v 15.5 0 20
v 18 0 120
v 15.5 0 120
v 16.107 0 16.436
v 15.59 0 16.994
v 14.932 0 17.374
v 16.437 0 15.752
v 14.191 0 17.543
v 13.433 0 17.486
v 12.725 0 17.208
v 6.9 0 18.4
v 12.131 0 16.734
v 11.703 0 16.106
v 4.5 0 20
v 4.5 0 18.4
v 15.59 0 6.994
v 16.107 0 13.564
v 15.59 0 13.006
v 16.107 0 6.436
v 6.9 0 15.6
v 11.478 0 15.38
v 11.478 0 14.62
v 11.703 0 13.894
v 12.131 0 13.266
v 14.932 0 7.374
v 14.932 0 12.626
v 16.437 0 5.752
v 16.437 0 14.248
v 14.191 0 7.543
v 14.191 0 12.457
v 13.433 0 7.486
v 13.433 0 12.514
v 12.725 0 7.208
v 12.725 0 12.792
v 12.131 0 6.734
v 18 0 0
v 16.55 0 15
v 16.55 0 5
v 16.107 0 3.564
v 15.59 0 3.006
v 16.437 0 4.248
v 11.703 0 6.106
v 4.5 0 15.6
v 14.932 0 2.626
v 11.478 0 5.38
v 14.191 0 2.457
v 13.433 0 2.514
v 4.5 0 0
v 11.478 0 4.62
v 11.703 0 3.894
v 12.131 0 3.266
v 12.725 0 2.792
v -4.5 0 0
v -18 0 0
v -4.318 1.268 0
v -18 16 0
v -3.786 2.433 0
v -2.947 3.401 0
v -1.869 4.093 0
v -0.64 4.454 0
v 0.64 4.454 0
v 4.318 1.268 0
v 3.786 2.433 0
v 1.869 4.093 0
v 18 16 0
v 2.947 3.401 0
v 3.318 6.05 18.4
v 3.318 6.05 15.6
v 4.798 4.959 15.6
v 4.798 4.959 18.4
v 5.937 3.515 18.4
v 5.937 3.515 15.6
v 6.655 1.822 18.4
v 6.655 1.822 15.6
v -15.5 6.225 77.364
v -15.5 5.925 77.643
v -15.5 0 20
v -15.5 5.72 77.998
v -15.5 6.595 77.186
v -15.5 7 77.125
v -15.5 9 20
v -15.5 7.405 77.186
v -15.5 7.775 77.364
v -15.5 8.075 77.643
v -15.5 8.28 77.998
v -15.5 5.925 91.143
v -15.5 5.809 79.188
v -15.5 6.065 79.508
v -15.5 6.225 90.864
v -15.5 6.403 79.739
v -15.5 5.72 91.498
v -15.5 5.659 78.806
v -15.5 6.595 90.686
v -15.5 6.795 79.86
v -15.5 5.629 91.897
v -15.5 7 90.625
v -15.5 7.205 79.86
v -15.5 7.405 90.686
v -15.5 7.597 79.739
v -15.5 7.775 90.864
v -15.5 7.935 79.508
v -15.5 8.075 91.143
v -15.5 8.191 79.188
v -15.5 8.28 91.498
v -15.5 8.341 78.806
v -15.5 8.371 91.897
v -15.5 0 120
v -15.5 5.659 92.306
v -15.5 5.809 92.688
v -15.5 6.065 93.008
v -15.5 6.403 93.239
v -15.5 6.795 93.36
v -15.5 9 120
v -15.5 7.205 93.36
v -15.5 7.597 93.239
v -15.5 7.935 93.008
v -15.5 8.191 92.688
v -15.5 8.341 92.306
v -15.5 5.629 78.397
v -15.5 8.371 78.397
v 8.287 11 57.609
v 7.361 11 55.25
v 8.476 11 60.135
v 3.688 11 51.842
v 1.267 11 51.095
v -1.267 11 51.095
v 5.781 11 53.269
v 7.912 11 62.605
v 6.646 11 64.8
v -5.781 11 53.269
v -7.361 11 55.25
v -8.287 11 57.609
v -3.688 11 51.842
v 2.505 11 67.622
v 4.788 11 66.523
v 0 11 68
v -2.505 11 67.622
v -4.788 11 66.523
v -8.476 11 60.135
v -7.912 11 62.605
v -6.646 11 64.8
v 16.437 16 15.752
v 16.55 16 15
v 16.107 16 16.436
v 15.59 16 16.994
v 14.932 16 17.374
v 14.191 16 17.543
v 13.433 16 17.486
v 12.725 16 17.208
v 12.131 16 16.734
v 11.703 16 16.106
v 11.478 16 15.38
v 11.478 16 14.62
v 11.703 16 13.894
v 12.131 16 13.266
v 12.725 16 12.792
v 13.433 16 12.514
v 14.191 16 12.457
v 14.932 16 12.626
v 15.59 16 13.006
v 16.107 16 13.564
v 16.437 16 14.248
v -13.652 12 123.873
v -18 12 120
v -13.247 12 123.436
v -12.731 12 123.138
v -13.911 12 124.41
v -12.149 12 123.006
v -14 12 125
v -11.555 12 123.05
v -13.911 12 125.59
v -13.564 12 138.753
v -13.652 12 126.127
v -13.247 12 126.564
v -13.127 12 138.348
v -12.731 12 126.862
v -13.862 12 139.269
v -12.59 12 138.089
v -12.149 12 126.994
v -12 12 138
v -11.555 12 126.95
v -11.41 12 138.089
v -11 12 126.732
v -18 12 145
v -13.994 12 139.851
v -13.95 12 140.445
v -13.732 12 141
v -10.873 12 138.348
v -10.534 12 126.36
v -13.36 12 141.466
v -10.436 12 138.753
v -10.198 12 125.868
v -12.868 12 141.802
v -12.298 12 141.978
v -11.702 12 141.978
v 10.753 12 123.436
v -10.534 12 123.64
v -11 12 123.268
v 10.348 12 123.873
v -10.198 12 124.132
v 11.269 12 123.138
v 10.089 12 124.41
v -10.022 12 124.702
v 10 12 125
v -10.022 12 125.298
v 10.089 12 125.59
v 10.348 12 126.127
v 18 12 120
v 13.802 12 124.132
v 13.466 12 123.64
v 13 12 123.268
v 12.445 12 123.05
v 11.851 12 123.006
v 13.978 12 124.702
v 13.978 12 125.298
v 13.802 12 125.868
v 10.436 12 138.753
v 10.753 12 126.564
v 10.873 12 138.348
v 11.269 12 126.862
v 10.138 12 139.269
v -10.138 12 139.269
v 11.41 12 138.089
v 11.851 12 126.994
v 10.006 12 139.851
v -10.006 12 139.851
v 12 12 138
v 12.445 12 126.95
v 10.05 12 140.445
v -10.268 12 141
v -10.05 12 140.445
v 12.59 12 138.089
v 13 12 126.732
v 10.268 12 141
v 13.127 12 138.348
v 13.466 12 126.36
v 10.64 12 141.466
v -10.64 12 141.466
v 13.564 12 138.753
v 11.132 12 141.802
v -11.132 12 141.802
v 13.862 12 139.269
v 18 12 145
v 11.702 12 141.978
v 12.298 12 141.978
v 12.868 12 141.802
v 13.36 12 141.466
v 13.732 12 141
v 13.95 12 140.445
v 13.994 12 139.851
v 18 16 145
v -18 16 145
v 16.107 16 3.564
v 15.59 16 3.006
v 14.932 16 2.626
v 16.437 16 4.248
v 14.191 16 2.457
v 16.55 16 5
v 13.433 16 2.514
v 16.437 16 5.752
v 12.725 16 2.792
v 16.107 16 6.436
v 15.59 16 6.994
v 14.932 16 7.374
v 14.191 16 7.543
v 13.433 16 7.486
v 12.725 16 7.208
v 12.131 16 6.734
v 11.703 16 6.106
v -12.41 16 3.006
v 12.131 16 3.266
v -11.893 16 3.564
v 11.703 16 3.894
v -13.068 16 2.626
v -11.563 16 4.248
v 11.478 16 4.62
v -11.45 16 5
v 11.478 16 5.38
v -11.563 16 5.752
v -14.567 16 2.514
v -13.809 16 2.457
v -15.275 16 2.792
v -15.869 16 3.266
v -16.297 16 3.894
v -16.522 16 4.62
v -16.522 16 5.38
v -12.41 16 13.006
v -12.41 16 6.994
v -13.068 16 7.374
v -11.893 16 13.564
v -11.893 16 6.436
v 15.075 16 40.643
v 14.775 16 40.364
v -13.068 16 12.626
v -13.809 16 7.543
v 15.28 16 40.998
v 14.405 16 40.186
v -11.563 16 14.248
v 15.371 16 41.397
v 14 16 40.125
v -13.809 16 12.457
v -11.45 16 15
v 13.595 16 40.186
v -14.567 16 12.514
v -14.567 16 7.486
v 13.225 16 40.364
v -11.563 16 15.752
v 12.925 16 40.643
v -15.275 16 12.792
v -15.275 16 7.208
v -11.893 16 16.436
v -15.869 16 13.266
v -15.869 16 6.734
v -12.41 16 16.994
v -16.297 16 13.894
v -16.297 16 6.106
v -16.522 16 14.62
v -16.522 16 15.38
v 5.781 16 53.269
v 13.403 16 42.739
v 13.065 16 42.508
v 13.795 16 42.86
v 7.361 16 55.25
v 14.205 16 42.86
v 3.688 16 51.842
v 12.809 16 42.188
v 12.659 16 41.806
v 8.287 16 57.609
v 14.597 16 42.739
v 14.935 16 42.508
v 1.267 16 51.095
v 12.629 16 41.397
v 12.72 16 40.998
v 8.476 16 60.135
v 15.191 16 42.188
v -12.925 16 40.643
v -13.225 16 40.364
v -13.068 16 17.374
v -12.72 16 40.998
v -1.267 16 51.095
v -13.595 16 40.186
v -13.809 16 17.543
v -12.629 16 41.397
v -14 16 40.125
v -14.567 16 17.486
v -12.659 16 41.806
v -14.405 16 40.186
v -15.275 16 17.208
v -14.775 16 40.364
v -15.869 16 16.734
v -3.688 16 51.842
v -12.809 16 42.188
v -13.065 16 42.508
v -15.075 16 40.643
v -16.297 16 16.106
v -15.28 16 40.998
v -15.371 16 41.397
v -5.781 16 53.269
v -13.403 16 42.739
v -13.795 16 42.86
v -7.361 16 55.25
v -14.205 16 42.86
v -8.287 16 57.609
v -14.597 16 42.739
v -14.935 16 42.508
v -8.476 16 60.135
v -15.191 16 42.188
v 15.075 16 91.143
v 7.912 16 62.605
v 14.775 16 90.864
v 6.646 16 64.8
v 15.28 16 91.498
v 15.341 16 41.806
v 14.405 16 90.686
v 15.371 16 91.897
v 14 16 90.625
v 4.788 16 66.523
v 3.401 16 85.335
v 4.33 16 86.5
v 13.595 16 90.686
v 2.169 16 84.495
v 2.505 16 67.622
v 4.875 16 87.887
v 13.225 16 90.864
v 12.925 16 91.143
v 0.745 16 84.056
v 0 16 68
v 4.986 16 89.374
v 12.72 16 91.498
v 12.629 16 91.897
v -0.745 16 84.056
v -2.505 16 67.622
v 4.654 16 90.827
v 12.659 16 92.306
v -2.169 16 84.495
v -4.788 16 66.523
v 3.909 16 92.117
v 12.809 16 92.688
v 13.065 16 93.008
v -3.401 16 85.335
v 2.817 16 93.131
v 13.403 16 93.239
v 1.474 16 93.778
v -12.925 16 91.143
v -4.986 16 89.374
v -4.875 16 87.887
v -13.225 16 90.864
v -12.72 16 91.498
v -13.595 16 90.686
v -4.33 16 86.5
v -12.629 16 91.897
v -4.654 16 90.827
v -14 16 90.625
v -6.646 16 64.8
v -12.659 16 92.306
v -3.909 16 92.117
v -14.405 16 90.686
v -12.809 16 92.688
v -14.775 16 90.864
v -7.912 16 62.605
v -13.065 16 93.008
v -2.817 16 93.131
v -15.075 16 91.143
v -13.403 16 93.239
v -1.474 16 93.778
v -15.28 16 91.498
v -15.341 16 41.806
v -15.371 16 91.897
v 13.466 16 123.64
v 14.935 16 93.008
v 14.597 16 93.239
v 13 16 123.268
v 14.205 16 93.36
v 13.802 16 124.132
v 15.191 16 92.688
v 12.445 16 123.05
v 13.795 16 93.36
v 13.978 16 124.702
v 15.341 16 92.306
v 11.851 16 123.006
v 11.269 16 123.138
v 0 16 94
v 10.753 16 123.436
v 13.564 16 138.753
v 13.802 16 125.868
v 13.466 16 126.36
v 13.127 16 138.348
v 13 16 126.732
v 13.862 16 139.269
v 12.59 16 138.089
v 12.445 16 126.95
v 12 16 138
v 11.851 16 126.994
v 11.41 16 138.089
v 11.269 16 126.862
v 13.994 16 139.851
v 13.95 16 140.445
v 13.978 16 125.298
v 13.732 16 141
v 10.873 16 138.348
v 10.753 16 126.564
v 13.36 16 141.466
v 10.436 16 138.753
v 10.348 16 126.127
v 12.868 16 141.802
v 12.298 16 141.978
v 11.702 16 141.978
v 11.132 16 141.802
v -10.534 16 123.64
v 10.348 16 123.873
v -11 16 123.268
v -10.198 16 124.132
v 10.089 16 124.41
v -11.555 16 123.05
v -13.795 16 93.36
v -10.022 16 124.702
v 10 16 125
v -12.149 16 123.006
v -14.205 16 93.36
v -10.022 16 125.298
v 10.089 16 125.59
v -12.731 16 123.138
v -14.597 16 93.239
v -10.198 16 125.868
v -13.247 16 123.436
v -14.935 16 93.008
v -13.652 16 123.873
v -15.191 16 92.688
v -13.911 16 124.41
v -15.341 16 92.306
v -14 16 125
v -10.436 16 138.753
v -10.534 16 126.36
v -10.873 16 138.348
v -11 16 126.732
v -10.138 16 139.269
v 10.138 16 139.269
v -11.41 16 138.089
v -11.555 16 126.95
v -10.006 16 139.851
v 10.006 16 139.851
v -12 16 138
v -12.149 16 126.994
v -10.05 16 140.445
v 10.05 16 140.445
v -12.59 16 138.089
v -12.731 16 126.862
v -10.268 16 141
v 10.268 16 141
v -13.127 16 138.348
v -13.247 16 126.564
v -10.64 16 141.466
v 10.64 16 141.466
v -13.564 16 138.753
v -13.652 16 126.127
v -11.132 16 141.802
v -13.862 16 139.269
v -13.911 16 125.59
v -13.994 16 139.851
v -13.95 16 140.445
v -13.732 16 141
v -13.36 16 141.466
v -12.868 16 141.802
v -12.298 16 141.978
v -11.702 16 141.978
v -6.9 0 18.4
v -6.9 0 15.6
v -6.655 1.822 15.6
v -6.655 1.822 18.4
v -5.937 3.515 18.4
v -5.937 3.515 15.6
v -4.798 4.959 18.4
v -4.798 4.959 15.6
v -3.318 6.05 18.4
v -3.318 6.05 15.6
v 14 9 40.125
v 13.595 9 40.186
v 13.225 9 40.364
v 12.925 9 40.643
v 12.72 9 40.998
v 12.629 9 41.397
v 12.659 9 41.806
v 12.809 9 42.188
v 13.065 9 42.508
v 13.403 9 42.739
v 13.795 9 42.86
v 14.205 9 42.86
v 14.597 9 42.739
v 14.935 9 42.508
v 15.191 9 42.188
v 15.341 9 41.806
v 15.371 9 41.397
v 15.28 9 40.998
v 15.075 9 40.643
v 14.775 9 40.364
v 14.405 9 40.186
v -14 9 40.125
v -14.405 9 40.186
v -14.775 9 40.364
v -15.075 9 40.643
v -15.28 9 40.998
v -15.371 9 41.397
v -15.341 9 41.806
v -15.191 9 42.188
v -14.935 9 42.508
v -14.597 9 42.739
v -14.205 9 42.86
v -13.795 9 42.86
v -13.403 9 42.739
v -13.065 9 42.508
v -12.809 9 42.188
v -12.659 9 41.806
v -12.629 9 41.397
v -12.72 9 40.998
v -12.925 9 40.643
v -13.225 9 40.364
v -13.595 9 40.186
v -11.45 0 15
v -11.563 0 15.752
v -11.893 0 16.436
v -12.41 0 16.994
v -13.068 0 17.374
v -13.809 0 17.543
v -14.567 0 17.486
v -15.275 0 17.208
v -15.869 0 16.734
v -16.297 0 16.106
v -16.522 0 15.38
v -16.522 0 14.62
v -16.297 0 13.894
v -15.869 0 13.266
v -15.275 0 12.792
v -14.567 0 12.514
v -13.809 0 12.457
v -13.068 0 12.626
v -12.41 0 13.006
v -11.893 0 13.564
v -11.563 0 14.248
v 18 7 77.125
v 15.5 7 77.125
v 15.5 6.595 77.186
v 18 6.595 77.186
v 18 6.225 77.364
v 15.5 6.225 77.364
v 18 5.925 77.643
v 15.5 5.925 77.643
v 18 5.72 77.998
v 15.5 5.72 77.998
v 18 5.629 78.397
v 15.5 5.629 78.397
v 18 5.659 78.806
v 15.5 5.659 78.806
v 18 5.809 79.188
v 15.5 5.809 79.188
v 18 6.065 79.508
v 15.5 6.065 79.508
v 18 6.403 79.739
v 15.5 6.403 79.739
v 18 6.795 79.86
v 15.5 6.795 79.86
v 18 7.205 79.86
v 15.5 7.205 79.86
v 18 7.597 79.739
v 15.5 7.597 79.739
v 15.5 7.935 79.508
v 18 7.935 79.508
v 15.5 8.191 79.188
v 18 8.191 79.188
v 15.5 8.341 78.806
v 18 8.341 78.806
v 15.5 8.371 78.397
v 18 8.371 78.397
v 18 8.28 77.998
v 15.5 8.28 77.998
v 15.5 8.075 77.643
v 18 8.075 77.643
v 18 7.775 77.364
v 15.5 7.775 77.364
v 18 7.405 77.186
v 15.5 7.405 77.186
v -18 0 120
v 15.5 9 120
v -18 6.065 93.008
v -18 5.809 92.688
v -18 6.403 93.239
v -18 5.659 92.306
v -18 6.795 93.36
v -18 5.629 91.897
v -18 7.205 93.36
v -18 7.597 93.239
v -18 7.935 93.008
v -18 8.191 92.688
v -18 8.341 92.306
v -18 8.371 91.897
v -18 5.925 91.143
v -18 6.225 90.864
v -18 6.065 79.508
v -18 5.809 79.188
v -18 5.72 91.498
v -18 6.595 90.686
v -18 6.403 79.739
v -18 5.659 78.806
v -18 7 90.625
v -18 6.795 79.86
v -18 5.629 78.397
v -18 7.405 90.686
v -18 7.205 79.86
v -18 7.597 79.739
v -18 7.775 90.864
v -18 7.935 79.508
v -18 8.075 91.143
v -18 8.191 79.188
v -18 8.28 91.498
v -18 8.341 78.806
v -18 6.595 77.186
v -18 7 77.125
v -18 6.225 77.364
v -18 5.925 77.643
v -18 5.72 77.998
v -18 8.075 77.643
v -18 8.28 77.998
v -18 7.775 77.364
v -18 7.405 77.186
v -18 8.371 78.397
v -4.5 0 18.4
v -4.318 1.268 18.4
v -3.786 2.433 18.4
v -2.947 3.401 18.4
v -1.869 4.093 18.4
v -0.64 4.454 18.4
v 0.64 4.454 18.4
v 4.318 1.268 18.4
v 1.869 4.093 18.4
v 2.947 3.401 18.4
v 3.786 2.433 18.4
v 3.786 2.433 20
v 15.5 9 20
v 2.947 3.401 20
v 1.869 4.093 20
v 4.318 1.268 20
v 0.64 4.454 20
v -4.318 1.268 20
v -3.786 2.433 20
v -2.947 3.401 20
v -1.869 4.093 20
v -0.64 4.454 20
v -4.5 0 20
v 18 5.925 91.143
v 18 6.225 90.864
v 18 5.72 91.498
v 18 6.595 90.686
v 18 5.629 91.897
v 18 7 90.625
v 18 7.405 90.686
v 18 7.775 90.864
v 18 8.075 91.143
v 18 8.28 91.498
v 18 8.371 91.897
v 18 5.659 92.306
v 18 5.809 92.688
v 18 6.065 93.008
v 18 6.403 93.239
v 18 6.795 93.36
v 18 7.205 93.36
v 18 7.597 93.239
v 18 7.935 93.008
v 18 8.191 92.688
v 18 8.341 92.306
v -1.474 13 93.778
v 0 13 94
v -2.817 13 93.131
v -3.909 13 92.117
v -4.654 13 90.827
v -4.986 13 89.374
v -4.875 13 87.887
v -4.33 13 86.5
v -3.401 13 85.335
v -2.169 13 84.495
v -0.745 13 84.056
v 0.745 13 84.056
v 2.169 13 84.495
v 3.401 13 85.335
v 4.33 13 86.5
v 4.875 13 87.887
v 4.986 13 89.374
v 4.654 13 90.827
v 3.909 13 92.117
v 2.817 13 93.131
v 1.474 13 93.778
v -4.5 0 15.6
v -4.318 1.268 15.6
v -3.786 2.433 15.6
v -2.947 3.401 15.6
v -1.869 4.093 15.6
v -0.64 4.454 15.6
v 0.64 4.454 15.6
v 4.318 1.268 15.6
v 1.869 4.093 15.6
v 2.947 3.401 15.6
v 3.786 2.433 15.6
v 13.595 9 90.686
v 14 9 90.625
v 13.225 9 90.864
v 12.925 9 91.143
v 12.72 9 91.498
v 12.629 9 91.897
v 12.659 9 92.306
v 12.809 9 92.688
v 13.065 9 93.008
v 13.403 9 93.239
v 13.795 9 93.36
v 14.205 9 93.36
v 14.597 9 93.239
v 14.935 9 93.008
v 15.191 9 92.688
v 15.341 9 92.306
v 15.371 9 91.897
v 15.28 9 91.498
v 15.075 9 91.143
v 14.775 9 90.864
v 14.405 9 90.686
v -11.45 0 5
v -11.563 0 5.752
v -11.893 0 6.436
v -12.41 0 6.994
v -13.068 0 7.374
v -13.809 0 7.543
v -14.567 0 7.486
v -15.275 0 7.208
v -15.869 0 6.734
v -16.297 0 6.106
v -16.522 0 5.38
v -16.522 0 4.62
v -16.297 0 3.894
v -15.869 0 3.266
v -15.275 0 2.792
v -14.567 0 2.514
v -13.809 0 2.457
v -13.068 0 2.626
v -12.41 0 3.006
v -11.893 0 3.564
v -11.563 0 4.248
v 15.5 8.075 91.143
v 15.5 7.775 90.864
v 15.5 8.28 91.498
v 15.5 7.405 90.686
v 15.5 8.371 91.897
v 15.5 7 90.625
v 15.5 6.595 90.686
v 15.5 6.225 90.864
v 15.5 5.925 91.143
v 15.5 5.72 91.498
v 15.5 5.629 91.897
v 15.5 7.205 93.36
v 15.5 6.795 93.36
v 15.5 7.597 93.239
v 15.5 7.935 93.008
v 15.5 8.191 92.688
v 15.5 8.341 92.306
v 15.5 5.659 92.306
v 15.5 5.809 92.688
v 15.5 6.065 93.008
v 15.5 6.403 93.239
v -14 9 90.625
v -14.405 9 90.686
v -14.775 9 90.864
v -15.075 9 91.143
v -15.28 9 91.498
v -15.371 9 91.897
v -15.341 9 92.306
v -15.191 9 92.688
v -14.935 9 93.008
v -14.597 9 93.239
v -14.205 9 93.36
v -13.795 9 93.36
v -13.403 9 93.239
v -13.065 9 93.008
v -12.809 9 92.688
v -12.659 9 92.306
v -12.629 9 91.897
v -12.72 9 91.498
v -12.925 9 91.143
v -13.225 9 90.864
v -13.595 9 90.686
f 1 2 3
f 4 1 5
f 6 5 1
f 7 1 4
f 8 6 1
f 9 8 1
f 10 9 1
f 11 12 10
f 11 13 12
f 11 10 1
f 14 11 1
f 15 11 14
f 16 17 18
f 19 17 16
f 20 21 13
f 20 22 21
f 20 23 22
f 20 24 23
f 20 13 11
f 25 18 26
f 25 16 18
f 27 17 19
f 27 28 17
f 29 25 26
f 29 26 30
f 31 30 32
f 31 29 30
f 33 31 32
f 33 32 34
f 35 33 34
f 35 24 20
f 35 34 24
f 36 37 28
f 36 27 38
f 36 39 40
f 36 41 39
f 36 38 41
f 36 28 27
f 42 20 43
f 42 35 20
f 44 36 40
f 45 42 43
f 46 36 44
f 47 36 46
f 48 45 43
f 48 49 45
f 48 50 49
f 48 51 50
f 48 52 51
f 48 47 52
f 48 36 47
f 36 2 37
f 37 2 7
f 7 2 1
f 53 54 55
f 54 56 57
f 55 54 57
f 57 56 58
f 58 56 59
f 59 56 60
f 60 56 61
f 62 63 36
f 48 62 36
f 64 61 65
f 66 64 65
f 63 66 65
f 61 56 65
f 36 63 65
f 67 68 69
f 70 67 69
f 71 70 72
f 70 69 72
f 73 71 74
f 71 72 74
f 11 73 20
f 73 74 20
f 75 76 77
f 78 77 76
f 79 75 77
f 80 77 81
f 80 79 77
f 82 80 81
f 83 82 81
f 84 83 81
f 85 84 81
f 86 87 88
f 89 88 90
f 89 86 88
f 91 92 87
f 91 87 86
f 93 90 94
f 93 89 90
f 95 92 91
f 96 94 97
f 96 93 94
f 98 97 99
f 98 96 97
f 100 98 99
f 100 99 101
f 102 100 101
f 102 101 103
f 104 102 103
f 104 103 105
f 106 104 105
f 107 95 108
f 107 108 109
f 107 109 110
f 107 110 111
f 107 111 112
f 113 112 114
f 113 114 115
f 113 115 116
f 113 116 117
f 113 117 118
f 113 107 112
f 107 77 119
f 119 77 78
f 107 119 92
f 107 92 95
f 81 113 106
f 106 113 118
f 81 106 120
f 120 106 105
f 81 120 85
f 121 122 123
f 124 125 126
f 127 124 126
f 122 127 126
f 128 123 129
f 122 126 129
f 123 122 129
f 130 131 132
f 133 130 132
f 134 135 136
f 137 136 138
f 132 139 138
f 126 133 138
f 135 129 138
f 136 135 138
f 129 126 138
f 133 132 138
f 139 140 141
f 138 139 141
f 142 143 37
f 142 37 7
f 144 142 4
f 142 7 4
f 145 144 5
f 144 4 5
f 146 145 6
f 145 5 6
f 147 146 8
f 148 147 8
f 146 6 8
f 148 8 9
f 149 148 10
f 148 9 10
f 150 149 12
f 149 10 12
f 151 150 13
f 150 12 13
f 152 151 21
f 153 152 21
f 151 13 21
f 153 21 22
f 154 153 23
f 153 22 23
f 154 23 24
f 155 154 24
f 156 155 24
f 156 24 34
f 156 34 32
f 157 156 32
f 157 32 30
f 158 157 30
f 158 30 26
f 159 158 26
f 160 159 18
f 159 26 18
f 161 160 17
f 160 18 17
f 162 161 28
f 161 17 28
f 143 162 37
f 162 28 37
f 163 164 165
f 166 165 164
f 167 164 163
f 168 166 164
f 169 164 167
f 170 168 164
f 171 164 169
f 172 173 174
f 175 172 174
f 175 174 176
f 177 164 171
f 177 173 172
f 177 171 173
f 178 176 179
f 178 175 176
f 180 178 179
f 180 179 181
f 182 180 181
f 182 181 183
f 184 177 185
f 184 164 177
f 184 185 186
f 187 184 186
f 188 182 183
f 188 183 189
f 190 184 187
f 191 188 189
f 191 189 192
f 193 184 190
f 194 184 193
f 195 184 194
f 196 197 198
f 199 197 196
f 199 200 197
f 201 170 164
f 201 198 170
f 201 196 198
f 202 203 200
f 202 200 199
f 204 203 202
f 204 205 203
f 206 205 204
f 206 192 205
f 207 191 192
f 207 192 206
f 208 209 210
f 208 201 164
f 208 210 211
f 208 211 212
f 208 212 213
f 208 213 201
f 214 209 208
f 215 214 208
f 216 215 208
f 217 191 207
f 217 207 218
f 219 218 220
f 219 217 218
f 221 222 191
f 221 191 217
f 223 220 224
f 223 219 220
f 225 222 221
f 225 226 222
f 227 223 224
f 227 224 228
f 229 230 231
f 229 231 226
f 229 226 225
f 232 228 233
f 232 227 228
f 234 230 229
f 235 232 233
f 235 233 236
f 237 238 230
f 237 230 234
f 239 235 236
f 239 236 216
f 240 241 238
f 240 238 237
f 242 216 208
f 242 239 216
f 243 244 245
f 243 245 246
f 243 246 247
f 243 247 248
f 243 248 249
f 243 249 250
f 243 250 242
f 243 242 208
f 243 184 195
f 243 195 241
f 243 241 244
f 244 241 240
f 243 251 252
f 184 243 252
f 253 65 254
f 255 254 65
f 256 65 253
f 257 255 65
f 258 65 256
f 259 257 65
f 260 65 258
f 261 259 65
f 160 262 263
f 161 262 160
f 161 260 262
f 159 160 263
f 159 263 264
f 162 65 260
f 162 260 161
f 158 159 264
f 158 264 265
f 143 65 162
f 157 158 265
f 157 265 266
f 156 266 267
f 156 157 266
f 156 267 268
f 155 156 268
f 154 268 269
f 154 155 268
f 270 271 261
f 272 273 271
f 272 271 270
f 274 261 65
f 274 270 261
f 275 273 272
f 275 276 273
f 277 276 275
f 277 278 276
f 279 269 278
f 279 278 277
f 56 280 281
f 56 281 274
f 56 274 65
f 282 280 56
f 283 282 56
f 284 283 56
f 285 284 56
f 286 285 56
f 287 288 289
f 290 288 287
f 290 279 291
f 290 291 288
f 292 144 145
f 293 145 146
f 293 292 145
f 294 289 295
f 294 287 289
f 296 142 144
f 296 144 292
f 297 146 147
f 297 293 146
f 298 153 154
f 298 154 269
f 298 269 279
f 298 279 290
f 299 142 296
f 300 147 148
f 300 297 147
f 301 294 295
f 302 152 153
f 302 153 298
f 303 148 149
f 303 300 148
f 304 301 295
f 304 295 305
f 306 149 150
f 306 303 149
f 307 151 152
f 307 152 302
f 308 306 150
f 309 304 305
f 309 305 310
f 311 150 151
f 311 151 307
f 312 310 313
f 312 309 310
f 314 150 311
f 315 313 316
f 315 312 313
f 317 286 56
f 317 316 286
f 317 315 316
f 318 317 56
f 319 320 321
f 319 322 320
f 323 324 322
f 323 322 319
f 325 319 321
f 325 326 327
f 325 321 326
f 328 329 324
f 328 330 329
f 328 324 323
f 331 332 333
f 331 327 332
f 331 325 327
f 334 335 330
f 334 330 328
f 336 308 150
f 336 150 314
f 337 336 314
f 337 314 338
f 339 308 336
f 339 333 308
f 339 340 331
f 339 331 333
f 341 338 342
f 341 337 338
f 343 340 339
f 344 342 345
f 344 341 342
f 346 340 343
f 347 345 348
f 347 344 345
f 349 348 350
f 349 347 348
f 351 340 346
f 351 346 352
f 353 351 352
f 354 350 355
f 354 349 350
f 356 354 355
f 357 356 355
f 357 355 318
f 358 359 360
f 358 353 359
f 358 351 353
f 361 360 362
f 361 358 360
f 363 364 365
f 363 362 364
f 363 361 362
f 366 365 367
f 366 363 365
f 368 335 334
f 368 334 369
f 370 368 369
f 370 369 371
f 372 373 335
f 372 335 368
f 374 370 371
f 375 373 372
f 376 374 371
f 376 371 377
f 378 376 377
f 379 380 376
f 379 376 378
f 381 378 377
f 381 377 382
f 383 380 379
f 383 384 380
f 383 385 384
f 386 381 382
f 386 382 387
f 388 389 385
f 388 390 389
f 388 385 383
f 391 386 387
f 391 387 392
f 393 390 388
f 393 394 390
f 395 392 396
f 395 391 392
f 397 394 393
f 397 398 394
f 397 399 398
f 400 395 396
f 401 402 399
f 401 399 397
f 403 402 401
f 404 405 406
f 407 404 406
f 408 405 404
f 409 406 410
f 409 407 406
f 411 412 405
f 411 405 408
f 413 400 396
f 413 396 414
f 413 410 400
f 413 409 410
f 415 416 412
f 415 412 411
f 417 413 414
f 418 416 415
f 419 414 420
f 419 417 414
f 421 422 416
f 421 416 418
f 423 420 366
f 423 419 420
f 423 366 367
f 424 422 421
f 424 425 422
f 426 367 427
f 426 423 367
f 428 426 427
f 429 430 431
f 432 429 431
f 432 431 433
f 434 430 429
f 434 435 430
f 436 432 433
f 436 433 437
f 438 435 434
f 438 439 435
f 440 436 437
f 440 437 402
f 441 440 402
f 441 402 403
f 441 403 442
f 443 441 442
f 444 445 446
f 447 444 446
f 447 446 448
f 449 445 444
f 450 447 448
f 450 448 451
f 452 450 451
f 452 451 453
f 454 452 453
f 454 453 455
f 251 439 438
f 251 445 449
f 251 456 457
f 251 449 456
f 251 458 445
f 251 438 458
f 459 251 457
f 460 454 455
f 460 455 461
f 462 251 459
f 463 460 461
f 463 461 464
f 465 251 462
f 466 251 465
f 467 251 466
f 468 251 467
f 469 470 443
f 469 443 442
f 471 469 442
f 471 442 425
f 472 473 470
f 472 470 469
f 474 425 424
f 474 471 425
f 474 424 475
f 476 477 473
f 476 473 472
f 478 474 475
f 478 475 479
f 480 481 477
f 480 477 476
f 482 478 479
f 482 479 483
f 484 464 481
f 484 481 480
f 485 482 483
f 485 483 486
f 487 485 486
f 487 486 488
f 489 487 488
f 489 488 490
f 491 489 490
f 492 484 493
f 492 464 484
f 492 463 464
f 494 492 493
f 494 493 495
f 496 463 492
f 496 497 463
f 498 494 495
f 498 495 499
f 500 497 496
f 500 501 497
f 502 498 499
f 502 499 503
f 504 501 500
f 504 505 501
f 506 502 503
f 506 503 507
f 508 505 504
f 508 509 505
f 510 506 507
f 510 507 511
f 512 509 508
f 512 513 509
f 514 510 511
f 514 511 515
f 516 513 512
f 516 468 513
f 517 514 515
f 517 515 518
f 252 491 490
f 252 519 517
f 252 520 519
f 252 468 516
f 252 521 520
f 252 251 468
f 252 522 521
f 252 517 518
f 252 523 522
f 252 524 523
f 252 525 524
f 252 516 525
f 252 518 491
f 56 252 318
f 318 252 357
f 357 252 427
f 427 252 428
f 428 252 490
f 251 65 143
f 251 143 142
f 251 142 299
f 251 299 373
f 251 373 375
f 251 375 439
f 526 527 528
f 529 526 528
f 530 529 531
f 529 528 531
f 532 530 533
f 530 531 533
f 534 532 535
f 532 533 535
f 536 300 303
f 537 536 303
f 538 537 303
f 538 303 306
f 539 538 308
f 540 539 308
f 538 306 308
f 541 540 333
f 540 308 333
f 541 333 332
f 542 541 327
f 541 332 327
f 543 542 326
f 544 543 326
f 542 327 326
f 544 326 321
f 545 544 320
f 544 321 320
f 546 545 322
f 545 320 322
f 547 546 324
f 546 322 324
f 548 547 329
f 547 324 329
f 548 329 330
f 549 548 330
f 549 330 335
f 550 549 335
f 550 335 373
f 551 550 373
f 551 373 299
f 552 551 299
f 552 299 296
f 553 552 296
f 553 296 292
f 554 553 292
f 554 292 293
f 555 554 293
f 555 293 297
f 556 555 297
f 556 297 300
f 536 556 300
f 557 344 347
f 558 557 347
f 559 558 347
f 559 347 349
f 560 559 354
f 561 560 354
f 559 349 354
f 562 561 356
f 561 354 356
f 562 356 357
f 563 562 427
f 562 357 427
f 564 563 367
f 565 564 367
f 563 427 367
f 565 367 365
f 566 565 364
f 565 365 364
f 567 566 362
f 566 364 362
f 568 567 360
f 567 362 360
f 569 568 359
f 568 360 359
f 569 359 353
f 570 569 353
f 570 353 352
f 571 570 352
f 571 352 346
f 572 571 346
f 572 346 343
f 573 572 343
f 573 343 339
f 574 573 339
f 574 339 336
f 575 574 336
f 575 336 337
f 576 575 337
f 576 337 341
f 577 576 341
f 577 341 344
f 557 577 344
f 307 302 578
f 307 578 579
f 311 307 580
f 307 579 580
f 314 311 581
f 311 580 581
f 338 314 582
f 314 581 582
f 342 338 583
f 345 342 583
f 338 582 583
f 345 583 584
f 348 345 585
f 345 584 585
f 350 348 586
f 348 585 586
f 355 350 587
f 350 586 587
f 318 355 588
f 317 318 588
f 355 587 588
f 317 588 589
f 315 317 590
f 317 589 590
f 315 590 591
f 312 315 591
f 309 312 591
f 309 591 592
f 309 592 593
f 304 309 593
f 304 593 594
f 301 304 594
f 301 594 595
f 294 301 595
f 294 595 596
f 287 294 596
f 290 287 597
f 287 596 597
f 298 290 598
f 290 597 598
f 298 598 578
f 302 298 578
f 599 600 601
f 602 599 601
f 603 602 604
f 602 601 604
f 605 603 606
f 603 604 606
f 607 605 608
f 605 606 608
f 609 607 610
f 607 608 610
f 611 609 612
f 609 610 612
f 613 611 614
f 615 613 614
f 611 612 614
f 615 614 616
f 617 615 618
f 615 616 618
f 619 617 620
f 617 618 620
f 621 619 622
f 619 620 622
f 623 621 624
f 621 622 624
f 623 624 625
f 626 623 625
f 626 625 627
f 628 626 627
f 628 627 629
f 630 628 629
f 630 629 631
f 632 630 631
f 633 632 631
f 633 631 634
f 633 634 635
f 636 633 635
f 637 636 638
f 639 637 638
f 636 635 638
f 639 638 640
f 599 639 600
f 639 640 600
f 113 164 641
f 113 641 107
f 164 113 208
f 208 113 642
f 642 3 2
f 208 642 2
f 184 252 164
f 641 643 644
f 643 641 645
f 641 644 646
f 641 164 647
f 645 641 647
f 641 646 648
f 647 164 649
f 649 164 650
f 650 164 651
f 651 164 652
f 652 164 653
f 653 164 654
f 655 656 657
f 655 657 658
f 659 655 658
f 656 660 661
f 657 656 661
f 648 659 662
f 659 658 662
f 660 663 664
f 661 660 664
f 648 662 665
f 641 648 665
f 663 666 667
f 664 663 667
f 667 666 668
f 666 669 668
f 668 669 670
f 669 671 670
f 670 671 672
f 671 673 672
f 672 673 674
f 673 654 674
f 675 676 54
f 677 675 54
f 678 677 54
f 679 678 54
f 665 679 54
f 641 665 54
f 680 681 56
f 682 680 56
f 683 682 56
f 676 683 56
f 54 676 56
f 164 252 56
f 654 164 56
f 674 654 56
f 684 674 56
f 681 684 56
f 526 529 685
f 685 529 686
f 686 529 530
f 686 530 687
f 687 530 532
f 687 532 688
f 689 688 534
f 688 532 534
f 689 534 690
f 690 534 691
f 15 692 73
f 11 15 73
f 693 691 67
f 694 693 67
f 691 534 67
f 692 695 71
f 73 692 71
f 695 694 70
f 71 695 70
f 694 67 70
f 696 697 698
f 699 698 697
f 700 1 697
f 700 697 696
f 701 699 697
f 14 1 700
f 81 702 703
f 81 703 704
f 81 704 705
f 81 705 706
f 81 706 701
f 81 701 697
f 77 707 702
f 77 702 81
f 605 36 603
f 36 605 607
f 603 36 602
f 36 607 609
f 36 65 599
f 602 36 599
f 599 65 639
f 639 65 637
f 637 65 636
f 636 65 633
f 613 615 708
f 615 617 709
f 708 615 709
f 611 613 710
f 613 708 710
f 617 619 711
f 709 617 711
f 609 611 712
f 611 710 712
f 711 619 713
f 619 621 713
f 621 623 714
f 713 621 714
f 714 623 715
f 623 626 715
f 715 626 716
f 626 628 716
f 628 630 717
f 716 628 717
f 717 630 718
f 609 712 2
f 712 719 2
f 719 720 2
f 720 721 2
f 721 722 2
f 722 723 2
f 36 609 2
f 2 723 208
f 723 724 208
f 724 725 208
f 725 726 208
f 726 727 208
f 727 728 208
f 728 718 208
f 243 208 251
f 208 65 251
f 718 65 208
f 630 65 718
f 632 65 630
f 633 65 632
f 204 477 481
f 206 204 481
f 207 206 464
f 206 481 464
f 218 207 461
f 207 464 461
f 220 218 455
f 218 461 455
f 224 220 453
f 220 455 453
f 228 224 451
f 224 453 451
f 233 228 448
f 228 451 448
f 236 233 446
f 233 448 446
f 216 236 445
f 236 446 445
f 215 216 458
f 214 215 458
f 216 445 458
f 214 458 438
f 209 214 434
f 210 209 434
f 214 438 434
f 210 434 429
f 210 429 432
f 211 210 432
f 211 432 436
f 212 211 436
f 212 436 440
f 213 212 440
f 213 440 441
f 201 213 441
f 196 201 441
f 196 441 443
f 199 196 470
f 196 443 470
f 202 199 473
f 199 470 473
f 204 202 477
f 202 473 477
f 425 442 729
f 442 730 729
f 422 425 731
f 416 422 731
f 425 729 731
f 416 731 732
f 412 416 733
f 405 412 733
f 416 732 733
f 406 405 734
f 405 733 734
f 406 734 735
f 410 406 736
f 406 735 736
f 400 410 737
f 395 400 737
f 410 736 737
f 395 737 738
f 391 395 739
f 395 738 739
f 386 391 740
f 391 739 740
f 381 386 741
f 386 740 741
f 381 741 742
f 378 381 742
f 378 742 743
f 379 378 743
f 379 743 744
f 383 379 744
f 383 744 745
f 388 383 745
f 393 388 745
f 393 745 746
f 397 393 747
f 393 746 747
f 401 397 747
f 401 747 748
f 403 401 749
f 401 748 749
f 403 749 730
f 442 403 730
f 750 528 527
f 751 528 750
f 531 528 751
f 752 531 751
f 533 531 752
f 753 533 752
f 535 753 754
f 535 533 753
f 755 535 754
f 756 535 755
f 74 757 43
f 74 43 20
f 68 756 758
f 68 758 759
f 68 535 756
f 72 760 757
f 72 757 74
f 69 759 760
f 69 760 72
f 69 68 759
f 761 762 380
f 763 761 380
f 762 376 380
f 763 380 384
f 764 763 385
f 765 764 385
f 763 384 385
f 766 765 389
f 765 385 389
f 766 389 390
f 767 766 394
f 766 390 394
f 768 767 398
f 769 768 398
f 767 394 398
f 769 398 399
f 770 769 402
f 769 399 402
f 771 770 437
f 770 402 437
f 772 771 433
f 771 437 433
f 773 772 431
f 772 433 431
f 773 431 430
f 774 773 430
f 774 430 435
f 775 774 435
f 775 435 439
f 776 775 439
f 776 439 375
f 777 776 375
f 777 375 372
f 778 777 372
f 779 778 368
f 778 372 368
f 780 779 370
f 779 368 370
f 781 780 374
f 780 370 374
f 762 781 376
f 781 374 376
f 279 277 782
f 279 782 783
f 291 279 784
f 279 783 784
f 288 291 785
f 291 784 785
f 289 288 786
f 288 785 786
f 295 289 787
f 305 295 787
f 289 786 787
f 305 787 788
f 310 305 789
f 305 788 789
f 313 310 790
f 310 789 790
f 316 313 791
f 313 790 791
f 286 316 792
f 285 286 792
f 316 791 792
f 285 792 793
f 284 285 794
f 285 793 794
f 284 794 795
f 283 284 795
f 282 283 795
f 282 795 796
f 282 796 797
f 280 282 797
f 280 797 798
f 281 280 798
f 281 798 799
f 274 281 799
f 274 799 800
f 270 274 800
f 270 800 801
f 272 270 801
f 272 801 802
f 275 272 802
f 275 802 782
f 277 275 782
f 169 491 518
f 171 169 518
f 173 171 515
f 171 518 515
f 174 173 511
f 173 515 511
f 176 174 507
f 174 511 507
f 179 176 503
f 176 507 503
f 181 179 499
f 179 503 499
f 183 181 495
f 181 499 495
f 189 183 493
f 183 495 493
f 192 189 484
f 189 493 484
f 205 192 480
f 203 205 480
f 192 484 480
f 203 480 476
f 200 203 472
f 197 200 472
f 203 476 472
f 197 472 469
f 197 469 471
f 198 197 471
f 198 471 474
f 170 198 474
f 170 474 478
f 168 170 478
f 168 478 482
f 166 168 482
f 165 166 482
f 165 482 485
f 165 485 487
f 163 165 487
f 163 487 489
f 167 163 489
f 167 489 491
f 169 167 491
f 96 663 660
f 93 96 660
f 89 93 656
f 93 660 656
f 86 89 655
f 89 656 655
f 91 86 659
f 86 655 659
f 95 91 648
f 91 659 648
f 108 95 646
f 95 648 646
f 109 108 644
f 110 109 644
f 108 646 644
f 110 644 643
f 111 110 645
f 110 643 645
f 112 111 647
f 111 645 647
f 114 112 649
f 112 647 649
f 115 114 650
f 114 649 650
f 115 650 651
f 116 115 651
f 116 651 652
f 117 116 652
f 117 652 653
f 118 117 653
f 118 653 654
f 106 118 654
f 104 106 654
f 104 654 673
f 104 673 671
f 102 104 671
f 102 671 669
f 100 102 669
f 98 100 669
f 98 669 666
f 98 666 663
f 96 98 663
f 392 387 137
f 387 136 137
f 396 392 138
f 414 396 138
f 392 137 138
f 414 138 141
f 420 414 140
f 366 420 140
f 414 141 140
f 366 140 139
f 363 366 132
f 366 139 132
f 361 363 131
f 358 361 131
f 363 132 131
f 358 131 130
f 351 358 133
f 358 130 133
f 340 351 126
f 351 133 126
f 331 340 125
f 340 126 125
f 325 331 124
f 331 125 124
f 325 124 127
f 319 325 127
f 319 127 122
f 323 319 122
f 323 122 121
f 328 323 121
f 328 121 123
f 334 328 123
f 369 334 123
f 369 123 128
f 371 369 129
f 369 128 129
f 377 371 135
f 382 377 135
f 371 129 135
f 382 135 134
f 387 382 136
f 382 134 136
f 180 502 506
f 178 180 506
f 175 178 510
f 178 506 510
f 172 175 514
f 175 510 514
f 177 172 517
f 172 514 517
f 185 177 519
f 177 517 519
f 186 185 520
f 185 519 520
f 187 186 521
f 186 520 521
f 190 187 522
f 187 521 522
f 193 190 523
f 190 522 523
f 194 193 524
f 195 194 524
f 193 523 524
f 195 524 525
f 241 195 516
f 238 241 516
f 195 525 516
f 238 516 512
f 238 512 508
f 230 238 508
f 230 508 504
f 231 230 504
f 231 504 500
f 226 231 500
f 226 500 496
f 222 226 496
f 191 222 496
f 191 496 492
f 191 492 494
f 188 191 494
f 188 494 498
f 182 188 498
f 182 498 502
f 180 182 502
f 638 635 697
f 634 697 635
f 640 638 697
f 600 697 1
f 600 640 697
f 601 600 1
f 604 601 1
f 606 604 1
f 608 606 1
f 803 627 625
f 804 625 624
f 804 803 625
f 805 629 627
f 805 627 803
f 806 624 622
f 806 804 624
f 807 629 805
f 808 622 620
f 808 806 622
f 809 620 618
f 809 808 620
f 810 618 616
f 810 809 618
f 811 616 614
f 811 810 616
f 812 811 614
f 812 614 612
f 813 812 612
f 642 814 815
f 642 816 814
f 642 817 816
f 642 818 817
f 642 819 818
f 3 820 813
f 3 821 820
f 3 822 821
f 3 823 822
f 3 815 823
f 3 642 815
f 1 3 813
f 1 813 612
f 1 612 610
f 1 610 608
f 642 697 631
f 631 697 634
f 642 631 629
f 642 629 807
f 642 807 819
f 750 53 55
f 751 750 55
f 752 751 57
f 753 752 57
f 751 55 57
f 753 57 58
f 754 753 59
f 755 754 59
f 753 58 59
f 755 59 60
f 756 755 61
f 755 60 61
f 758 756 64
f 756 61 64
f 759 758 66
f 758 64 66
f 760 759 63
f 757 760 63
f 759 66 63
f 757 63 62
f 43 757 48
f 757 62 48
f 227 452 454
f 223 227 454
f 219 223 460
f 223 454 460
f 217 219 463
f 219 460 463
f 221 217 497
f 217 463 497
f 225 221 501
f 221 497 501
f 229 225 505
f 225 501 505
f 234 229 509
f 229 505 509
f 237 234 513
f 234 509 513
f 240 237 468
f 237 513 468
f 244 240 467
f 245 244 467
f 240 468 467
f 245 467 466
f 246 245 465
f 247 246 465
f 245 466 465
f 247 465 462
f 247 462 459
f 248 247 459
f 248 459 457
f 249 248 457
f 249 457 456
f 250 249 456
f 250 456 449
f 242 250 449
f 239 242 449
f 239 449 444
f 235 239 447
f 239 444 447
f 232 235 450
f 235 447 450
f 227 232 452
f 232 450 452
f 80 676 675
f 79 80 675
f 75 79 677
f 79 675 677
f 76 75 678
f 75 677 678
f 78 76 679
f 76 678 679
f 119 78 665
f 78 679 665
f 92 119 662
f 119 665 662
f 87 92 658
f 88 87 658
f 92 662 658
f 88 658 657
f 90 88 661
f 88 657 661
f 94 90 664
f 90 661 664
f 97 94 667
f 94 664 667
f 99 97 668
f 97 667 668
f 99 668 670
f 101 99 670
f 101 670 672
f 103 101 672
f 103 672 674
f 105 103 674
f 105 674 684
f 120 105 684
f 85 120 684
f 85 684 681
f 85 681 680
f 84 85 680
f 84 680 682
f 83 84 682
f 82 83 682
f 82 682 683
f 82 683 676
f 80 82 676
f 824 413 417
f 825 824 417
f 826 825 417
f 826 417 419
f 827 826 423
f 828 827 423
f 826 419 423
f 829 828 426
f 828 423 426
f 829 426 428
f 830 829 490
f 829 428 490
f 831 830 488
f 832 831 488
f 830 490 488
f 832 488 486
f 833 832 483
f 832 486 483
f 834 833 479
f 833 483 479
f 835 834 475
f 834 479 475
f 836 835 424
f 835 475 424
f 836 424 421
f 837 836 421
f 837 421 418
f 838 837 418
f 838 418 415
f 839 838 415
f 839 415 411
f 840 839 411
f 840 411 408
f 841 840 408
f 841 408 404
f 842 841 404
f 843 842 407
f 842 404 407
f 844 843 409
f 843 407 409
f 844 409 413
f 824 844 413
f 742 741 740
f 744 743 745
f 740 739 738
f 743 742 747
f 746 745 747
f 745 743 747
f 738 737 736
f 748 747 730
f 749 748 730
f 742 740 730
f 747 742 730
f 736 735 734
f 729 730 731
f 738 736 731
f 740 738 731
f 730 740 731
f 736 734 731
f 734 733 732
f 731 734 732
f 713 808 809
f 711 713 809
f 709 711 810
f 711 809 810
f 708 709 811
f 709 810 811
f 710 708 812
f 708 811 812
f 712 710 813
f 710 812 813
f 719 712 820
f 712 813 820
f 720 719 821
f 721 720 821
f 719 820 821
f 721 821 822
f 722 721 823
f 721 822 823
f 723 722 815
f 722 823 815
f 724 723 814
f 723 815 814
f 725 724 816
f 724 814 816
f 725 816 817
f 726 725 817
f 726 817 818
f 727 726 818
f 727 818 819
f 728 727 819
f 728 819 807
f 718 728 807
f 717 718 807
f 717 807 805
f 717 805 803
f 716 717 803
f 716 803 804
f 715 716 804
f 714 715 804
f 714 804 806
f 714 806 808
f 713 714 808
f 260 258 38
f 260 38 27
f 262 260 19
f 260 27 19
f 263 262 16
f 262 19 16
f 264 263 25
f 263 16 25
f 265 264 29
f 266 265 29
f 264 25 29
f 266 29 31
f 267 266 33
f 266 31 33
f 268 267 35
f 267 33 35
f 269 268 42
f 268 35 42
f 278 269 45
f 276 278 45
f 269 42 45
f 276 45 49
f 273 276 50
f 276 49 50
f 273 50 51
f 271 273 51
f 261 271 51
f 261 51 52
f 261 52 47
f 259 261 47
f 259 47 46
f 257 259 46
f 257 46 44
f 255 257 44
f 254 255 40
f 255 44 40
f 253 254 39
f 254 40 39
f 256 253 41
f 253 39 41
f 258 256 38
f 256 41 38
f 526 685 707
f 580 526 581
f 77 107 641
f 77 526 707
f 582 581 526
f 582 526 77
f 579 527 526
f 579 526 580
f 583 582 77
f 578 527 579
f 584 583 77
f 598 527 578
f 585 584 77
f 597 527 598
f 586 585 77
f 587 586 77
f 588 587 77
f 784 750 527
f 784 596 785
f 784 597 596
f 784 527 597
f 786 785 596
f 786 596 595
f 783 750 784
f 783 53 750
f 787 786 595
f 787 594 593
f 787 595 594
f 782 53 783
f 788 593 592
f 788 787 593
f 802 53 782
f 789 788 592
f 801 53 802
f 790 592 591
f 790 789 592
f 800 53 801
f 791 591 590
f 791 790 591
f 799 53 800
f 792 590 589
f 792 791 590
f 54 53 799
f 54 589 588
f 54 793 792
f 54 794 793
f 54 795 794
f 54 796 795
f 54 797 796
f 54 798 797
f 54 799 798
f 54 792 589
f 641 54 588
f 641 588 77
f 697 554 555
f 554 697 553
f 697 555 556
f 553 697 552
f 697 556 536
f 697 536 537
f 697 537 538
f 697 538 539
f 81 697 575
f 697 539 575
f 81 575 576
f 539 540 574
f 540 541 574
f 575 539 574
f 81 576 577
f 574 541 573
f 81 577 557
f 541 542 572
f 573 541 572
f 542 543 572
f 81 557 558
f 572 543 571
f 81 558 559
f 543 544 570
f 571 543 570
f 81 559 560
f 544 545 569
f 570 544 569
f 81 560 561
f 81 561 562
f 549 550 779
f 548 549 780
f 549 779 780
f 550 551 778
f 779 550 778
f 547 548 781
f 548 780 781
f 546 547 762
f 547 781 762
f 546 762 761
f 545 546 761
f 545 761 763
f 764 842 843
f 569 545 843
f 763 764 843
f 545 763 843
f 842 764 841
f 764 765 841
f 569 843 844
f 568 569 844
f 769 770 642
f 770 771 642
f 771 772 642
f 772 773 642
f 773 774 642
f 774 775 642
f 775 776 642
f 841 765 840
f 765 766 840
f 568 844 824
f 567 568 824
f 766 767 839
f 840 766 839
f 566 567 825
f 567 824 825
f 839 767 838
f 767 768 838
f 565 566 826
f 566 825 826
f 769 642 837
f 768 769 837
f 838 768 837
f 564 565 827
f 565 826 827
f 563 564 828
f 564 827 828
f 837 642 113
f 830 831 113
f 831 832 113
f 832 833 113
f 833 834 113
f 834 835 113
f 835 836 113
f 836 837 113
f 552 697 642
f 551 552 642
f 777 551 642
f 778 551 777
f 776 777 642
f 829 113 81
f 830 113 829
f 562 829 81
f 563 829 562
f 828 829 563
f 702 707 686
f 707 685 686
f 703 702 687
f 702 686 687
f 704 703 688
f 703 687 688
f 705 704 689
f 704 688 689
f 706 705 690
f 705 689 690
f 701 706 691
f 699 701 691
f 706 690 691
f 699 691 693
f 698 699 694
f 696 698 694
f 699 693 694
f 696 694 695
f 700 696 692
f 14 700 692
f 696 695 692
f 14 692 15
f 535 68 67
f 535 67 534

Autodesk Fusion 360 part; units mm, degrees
sketch "スケッチ1" plane through (0, 0, 0) normal (0, 0, 1) x (1, 0, 0)
  line L0 (-17.5, 11) -> (17.5, 11)
  line L1 (17.5, 11) -> (17.5, 0)
  line L2 (17.5, 0) -> (-17.5, 0)
  line L3 (-17.5, 0) -> (-17.5, 11)
  dimension "d1" = 35
  dimension "d2" = 11
extrude "押し出し1" add sketch "スケッチ1" along normal blind 120
sketch "スケッチ2" plane through (0, 0, 0) normal (0, 0, -1) x (1, 0, 0)
  line L0 (17.5, 0) -> (-17.5, 0)
  line L1 (-17.5, 0) -> (-17.5, -11)
  line L2 (-17.5, -11) -> (17.5, -11)
  line L3 (17.5, -11) -> (17.5, 0)
  circle A0 centre (0, 0) radius 4.5
  dimension "d5" = 9
extrude "押し出し2" cut sketch "スケッチ2" against normal blind 20 contours L0 A0 picked at (-0.548, -1.3963)
sketch "スケッチ3" plane through (0, 0, 120) normal (0, 0, 1) x (-1, 0, 0)
  line L0 (17.5, 0) -> (-17.5, 0)
  line L1 (-17.5, 0) -> (-17.5, -11)
  line L2 (-17.5, -11) -> (17.5, -11)
  line L3 (17.5, -11) -> (17.5, 0)
  line L4 (15.5, -9) -> (-15.5, -9)
  line L5 (-15.5, -9) -> (-15.5, 0)
  line L6 (-15.5, 0) -> (15.5, 0)
  line L7 (15.5, 0) -> (15.5, -9)
  dimension "d8" = 2
  dimension "d9" = 31
extrude "押し出し3" cut sketch "スケッチ3" against normal blind 100 contours L0 L4 L5 L6 L7
ref_plane "作業平面1" through (0, 5.5, 9) normal (0, 0, -1) x (-1, 0, 0)
sketch "スケッチ5" plane through (0, 11, 0) normal (0, 1, 0) x (-1, 0, 0)
  line L0 (-17.5, 0) -> (17.5, 0)
  line L1 (17.5, 0) -> (17.5, 120)
  line L2 (17.5, 120) -> (-17.5, 120)
  line L3 (-17.5, 120) -> (-17.5, 0)
  line L4 (-17.5, 130) -> (17.5, 130)
  line L5 (17.5, 130) -> (17.5, 120)
  line L6 (17.5, 120) -> (-17.5, 120)
  line L7 (-17.5, 120) -> (-17.5, 130)
  line L8 (-17.5, 125) -> (17.5, 125) construction
  circle A0 centre (12, 125) radius 2
  circle A1 centre (-12, 125) radius 2
  dimension "d16" = 4
  dimension "d17" = 4
  dimension "d18" = 24
  dimension "d19" = 10
  dimension "d20" = 5.5
extrude "押し出し5" add sketch "スケッチ5" against normal blind 2 contours L2 L4 L5 L6 L7
sketch "スケッチ8" plane through (0, 0, 0) normal (0, -1, 0) x (1, 0, 0)
  line L0 (-4.5, 20) -> (-15.5, 20)
  line L1 (-15.5, 20) -> (-15.5, 120)
  line L2 (-15.5, 120) -> (-17.5, 120)
  line L3 (-17.5, 120) -> (-17.5, 0)
  line L4 (-17.5, 0) -> (-4.5, 0)
  line L5 (-4.5, 0) -> (-4.5, 20)
  circle A0 centre (-14, 15) radius 2.55
  line L6 (18.5, 15) -> (-17.5, 15) construction
  line L7 (17.541, 5) -> (-17.5, 5) construction
  line L8 (15.5, 20) -> (4.5, 20) construction
  circle A1 centre (14, 15) radius 2.55
  circle A2 centre (14, 5) radius 2.55
  circle A3 centre (-14, 5) radius 2.55
  line L9 (17.5, 0) -> (17.5, 120)
  dimension "d30" = 5
  dimension "d31" = 10
  dimension "d32" = 5.1
  dimension "d33" = 5.1
  dimension "d34" = 5.1
  dimension "d35" = 5.1
  dimension "d36" = 3.5
  dimension "d37" = 3.5
  dimension "d38" = 3.5
  dimension "d39" = 3.5
extrude "押し出し8" cut sketch "スケッチ8" against normal blind 15 contours A0 | A1 | A2 | A3
move_face "OffsetFaces1" offset 3 1 faces at (-3.8517, 11, 52.6741)
sketch "Sketch9" plane through (0, 9, 0) normal (0, -1, 0) x (1, 0, 0)
  circle A0 centre (12, 125) radius 2
  circle A1 centre (-12, 125) radius 2
  line L0 (-15.5, 120) -> (-15.5, 20)
  line L1 (-15.5, 20) -> (15.5, 20)
  line L2 (15.5, 20) -> (15.5, 120)
  line L3 (15.5, 120) -> (17.5, 120)
  line L4 (17.5, 120) -> (17.5, 130)
  line L5 (17.5, 130) -> (-17.5, 130)
  line L6 (-17.5, 130) -> (-17.5, 120)
  line L7 (-17.5, 120) -> (-15.5, 120)
  point P0 (14, 41.5)
  point P1 (-14, 41.5)
  point P2 (-14, 92)
  point P3 (14, 92)
hole "Hole1" at (-14, 9, 92) at (14, 9, 92) at (14, 9, 41.5) at (-14, 9, 41.5) direction (0, 1, 0) diameter 2.75 depth 9 tip angle 118
ref_plane "WorkPlane2" through (0, 0, 17) normal (0, 0, 1) x (1, 0, 0)
sketch "Sketch13" plane through (0, 0, 17) normal (0, 0, 1) x (1, 0, 0)
  line L0 (3.3178, 6.05) -> (-3.3178, 6.05)
  arc A0 (-3.3178, 6.05) -> (3.3178, 6.05) centre (0, 0) ccw
  dimension "d63" = 13.8
extrude "Extrude9" cut sketch "Sketch13" along normal blind 1.4 and the other way blind 1.4
sketch "Sketch11" plane through (0, 9, 0) normal (0, -1, 0) x (1, 0, 0)
  circle A0 centre (-12, 125) radius 2
  circle A1 centre (12, 125) radius 2
  line L0 (-15.5, 120) -> (-15.5, 20)
  line L1 (-15.5, 20) -> (15.5, 20)
  line L2 (15.5, 20) -> (15.5, 120)
  line L3 (15.5, 120) -> (17.5, 120)
  line L4 (17.5, 120) -> (17.5, 130)
  line L5 (17.5, 130) -> (-17.5, 130)
  line L6 (-17.5, 130) -> (-17.5, 120)
  line L7 (-17.5, 120) -> (-15.5, 120)
  line L8 (-17.5, 130) -> (17.5, 130)
  line L9 (17.5, 130) -> (17.5, 120)
  line L10 (17.5, 120) -> (-17.5, 120)
  line L11 (-17.5, 120) -> (-17.5, 130)
  circle A2 centre (14, 41.5) radius 1.375
  circle A3 centre (-14, 92) radius 1.375
  circle A4 centre (14, 92) radius 1.375
  circle A5 centre (-14, 41.5) radius 1.375
extrude "Extrude10" cut sketch "Sketch11" against normal blind 3 contours L3 L4 L5 L6 L7 L8 L9 L10 L11
move_face "OffsetFaces2" offset 2 1 faces at (4.4189, 14, 58.7625)
move_face "OffsetFaces3" offset 15 1 faces at (5.8333, 13.3333, 130)
sketch "Sketch12" plane through (0, 12, 0) normal (0, -1, 0) x (1, 0, 0)
  circle A0 centre (12, 125) radius 2
  circle A1 centre (-12, 125) radius 2
  line L0 (-17.5, 120) -> (17.5, 120)
  line L1 (17.5, 120) -> (17.5, 145)
  line L2 (17.5, 145) -> (-17.5, 145)
  line L3 (-17.5, 145) -> (-17.5, 120)
  point P0 (-12, 140)
  point P1 (12, 140)
hole "Hole2" at (-12, 12, 140) at (12, 12, 140) direction (0, 1, 0) diameter 4 depth 5 tip angle 118
sketch "Sketch14" plane through (17.5, 0, 0) normal (1, 0, 0) x (0, 1, 0)
  line L0 (12, 120) -> (0, 120)
  line L1 (0, 120) -> (0, 0)
  line L2 (0, 0) -> (16, 0)
  line L3 (16, 0) -> (16, 145)
  line L4 (16, 145) -> (12, 145)
  line L5 (12, 145) -> (12, 120)
  line L6 (12, 120) -> (0, 120)
  line L7 (0, 120) -> (0, 0)
  line L8 (0, 0) -> (16, 0)
  line L9 (16, 0) -> (16, 145)
  line L10 (16, 145) -> (12, 145)
  line L11 (12, 145) -> (12, 120)
  point P0 (7, 92)
  point P1 (7, 78.5)
hole "Hole3" at (17.5, 7, 92) at (17.5, 7, 78.5) direction (-1, 0, 0) diameter 2.75 depth 200 tip angle 118
move_face "OffsetFaces4" offset 0.5 1 faces at (17.5, 7.6667, 25.7083)
move_face "OffsetFaces5" offset 0.5 1 faces at (-17.5, 7.6667, 25.7083)
sketch "Sketch15" plane through (0, 16, 0) normal (0, 1, 0) x (-1, 0, 0)
  circle A0 centre (12, 140) radius 2
  circle A1 centre (-12, 140) radius 2
  circle A2 centre (-14, 41.5) radius 1.375
  circle A3 centre (14, 92) radius 1.375
  circle A4 centre (-14, 92) radius 1.375
  circle A5 centre (14, 41.5) radius 1.375
  circle A6 centre (-14, 5) radius 2.55
  circle A7 centre (14, 5) radius 2.55
  circle A8 centre (-14, 15) radius 2.55
  circle A9 centre (14, 15) radius 2.55
  circle A10 centre (-12, 125) radius 2
  circle A11 centre (12, 125) radius 2
  line L0 (-18, 0) -> (18, 0)
  line L1 (18, 0) -> (18, 145)
  line L2 (18, 145) -> (-18, 145)
  line L3 (-18, 145) -> (-18, 0)
  point P0 (0, 89)
hole "Hole4" at (0, 16, 89) direction (0, -1, 0) diameter 10 depth 3 tip angle 180
sketch "Sketch17" plane through (0, 16, 0) normal (0, 1, 0) x (-1, 0, 0)
  point P0 (0, 59.5)
hole "Hole5" at (0, 16, 59.5) direction (0, -1, 0) diameter 17 depth 5 tip angle 180
